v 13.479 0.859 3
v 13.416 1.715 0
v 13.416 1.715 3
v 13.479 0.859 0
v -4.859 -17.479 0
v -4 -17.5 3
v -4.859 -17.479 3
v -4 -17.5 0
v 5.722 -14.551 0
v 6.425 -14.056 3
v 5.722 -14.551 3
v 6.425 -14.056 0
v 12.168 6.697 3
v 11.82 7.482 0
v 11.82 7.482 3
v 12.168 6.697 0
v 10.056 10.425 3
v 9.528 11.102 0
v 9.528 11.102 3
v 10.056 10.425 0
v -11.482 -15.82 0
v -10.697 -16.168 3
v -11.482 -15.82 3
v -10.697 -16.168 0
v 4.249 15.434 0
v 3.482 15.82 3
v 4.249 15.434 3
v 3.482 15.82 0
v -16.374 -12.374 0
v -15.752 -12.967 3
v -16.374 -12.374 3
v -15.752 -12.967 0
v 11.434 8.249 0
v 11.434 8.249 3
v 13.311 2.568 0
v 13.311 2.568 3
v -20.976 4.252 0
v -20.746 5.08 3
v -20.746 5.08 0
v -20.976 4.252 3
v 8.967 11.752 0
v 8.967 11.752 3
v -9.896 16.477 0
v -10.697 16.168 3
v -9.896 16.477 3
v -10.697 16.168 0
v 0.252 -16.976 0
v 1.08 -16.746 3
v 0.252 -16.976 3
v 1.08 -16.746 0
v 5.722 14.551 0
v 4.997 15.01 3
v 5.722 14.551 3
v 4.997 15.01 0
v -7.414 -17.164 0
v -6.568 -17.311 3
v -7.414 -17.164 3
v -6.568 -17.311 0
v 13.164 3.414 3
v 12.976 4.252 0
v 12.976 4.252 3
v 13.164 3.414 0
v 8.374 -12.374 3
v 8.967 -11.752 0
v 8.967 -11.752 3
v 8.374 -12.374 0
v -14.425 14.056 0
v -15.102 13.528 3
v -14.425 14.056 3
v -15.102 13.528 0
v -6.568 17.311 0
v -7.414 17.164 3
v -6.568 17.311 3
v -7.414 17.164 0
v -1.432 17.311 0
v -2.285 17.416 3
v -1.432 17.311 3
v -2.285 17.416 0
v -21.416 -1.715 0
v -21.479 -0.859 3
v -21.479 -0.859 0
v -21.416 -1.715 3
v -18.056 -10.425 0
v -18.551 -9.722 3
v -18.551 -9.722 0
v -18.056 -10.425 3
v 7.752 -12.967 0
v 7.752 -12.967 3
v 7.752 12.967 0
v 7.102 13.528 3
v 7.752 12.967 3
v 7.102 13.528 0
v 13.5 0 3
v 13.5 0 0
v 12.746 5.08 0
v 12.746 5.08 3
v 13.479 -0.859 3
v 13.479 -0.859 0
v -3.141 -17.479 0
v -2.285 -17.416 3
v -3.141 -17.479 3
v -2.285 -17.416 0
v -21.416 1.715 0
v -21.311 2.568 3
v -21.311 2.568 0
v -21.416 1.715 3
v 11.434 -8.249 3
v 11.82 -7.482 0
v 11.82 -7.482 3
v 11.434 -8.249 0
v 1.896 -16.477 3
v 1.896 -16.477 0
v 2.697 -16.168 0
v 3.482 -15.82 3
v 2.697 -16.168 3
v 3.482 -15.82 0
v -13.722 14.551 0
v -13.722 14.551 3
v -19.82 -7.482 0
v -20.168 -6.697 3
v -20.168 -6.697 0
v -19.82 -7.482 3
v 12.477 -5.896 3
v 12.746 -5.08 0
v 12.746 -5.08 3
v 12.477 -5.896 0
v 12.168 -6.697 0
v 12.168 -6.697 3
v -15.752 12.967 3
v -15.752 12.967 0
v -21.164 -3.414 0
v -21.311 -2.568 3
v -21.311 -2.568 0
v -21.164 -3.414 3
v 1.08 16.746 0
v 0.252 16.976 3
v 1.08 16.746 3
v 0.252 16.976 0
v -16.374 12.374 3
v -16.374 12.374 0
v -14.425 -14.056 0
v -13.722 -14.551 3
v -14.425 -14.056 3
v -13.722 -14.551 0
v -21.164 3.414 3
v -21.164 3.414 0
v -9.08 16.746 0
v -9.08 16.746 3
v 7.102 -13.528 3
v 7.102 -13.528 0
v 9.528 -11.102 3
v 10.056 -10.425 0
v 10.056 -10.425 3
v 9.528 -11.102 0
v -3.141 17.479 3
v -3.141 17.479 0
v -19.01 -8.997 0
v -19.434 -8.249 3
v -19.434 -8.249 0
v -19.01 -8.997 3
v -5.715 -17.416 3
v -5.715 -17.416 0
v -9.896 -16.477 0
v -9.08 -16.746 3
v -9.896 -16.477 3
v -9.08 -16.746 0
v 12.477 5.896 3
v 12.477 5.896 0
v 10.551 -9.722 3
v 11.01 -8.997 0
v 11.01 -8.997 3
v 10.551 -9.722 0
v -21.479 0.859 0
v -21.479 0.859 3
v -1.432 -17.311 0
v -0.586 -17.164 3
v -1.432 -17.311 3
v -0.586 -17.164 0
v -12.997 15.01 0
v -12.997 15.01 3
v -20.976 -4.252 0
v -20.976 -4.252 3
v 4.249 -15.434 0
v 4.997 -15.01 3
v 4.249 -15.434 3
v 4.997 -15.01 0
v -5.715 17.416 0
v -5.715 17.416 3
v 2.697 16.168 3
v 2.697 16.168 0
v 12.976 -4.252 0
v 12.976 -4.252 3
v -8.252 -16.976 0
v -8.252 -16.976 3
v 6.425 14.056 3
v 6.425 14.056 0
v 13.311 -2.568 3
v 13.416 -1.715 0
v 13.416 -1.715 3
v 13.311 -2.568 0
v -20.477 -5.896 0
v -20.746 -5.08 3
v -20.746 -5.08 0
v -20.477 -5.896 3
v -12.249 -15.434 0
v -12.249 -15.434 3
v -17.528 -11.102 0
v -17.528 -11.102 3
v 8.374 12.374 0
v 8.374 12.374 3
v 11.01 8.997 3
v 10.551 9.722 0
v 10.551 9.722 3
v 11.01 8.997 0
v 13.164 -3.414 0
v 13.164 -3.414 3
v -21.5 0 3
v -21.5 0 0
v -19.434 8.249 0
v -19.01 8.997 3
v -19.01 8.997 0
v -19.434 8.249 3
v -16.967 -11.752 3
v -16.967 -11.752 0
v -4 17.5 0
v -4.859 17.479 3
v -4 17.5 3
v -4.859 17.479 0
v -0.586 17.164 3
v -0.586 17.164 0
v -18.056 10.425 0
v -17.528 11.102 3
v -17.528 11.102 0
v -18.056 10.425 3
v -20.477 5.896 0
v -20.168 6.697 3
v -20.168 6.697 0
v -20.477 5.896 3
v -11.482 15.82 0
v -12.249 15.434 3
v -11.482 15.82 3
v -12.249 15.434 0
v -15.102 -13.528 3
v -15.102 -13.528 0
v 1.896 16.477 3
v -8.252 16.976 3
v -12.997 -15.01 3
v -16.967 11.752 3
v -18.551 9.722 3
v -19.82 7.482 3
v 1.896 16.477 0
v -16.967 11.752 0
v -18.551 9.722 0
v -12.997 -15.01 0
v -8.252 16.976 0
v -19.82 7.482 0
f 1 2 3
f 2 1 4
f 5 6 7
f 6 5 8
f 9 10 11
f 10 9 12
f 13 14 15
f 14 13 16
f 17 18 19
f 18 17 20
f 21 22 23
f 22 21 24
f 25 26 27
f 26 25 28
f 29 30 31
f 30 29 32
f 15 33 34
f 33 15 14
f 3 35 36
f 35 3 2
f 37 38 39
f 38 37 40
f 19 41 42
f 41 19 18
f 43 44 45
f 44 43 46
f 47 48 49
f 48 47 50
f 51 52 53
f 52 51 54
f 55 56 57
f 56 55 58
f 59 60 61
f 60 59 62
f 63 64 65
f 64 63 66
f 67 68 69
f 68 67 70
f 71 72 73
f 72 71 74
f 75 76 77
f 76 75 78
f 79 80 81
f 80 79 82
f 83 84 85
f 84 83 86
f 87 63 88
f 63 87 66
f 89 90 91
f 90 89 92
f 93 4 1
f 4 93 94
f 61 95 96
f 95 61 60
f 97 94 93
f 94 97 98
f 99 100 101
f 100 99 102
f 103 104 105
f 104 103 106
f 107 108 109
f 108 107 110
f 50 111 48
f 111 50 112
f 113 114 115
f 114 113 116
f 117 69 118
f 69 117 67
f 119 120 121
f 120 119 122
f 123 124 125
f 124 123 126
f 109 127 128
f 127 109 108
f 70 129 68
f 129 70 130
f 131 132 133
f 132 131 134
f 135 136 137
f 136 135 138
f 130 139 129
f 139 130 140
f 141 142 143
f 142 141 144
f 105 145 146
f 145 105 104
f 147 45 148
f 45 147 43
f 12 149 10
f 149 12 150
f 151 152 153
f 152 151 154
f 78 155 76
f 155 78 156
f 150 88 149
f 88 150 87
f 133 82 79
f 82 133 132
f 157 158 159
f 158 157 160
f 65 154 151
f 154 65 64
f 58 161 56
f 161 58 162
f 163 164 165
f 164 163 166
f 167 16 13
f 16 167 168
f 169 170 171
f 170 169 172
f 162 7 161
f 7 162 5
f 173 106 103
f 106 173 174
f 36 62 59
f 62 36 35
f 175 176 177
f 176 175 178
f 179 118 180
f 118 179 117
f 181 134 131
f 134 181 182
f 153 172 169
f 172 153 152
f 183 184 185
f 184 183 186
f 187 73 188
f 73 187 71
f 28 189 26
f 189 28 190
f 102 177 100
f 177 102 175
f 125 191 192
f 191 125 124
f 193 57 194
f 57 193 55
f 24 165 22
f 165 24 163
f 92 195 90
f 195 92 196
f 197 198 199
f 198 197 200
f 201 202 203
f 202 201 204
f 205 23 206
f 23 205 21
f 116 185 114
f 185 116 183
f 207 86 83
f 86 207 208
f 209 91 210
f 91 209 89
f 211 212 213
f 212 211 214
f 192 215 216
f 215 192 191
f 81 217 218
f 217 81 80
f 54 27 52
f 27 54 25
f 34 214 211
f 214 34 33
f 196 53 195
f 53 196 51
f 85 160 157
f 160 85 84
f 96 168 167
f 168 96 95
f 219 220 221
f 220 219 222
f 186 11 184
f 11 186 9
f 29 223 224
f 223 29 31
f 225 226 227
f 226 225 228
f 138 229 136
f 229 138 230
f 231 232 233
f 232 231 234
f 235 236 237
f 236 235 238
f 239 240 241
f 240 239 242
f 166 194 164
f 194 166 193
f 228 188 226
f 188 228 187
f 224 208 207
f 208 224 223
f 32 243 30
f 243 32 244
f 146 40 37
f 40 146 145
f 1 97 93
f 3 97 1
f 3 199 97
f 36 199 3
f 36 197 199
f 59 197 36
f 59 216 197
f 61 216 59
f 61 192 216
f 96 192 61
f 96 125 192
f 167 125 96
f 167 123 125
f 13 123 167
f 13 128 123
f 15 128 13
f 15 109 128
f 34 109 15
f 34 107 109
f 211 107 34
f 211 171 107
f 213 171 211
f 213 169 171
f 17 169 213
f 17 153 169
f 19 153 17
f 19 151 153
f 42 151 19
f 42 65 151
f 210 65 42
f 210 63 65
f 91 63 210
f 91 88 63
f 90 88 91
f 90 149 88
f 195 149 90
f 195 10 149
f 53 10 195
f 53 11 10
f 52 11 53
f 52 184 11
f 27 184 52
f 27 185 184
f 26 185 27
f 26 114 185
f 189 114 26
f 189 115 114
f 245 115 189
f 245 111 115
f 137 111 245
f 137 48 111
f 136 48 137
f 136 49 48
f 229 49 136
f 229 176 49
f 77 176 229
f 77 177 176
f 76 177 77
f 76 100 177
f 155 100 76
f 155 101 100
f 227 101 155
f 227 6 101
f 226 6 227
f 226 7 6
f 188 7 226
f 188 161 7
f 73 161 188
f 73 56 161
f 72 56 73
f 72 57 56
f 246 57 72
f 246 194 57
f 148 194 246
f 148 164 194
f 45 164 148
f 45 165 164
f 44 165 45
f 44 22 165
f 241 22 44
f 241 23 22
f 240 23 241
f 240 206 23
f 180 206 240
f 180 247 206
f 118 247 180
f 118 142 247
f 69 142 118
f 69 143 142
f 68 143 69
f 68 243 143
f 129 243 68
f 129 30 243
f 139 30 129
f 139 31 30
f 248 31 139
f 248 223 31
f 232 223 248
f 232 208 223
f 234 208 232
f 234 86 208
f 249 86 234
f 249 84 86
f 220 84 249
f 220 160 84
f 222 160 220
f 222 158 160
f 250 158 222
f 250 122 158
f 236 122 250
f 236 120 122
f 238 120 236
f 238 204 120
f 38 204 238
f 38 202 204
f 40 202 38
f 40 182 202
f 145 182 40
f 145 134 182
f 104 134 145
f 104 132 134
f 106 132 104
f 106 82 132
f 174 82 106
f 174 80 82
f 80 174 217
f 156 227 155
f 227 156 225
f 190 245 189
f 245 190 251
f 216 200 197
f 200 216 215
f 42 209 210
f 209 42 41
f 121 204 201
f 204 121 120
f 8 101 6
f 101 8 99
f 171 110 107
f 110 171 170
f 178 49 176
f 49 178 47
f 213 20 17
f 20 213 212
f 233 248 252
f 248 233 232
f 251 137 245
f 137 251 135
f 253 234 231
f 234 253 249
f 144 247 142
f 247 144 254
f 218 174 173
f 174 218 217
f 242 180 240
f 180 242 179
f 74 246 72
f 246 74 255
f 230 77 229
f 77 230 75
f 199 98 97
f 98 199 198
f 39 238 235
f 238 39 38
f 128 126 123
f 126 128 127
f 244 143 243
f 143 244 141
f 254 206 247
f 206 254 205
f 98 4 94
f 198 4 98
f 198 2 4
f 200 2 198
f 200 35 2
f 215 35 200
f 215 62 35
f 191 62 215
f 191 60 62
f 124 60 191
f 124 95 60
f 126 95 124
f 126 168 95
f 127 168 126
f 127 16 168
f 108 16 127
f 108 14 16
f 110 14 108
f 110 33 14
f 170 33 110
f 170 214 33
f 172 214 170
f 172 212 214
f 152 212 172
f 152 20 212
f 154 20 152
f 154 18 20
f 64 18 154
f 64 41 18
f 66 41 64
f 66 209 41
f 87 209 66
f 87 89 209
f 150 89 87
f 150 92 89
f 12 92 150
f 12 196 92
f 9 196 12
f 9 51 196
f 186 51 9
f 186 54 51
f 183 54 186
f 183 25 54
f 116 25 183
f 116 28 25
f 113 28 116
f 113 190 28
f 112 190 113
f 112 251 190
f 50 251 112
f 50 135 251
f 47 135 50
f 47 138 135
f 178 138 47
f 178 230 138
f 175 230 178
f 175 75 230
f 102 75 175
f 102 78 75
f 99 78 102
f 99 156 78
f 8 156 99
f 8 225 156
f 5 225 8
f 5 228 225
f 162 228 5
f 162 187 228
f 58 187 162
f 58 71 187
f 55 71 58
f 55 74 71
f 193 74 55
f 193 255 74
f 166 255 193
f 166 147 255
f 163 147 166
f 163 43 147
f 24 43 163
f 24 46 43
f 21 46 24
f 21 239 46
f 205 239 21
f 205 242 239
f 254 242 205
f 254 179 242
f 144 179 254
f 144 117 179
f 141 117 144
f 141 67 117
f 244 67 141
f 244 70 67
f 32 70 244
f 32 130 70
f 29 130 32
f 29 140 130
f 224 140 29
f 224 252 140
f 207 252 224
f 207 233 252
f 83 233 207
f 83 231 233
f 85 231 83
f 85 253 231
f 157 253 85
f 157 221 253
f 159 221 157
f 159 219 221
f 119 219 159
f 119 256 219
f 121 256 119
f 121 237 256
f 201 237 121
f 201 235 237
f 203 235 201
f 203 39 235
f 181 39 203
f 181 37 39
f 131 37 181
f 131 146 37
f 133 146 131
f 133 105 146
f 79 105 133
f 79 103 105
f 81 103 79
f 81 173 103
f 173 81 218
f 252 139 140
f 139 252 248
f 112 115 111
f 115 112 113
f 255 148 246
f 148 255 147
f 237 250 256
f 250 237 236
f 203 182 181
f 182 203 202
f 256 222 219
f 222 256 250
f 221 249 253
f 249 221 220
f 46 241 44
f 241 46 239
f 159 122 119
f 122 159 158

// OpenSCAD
// file: solid.scad
/*
 * Originally by TypicalTinkerer, 2021.
 * Dual licenced under Creative Commons Attribution-Share Alike 3.0 and LGPL2 or later
 */

function flatten(as) = [for(a = as) each a];

function gen_v_loop_squares(range) = let(nr = len(range), nc = len(range[0])) [for(col = [0:nc-1]) [col,(nr-1)*nc+col,(nr-1)*nc+(col+1)%nc,(col+1)%nc]];

function gen_surf_squares(range) = let(nr = len(range), nc = len(range[0])) [for(row = [0:nr-2], col = [0:nc-1]) let(i=row*nc) [i+col, i+(col+1)%nc, i+nc+(col+1)%nc, i+nc+col]];

function gen_squares(range, closed) = closed ? 
    flatten([gen_surf_squares(range), gen_v_loop_squares(range)]) : 
    flatten([gen_surf_squares(range)]);

function gen_surface(range, closed = false) = [[for(row=range) each row], gen_squares(range, closed)];

function flip_lr_row(row) = [for(i=[len(row)-1:-1:0]) row[i]];
function flip_lr(surface) = [for(row = surface) flip_lr_row(row)];
function flip_ud(surface) = [for(i = [len(surface)-1:-1:0]) surface[i]];

function range(u0, du, un) = let(us=[for(u=[u0 : du: un]) u], ua=(un-u0)%du) ua == 0 ? us : concat(us, [un]);
   
function domain(u0, du, un, v0, dv, dn) = [for(u=range(u0, du, un)) [for(v=range(v0, dv, dn)) [u, v]]];

function first_row(surface) = surface[0];    
function last_row(surface) = surface[len(surface) - 1];

function sum(vertices, result=[0, 0, 0], i=0) = i<len(vertices) ? sum(vertices, result+vertices[i], i+1) : result;

function end_surface(def, first) = let(nr = len(def), nc = len(def[0]), row = first ? 0 : nr-1) [first ? [for(col = [nc-1:-1:0]) let(i=row*nc+col) i] : [for(col = [0:nc-1]) let(i=(nr-1)*nc+col) i]];

function gen_capped_surface(def) = let(surf=gen_surface(def)) [surf[0], concat(surf[1], end_surface(def, true), end_surface(def, false))];

module solid(def) {
    polyhedron(def[0], def[1], 10);
}
// file: klein-bottle-with-hole.scad
/*
 * Originally by TypicalTinkerer, 2021.
 * Dual licenced under Creative Commons Attribution-Share Alike 3.0 and LGPL2 or later
 */
 
use <klein-bottle-functions.scad>;
use <solid.scad>;

module bottle_top(w, a, b, c, du, dv) {
    dom1 = domain(0, du, 180, 0, dv, 360);
    inner_range1 = [for(row=dom1) [for(uv=row) let(u=uv[0], v=uv[1]) klein1(u, v, a, b, c) - (w/2)*nklein1(u, v, a, b, c)]];    
    outer_range1 = [for(row=dom1) [for(uv=row) let(u=uv[0], v=uv[1]) klein1(u, v, a, b, c) + (w/2)*nklein1(u, v, a, b, c)]];

    dom3 = domain(270, du, 360, 0, dv, 360);
    inner_range3 = [for(row=dom3) [for(uv=row) let(u=uv[0], v=uv[1]) klein2(u, v, a, b, c) - (w/2)*nklein2(u, v, a, b, c)]];    
    outer_range3 = [for(row=dom3) [for(uv=row) let(u=uv[0], v=uv[1]) klein2(u, v, a, b, c) + (w/2)*nklein2(u, v, a, b, c)]];

    range_1_3 = concat(flip_lr(inner_range3), flip_lr(inner_range1), flip_ud(flip_lr(outer_range1)), flip_ud(flip_lr(outer_range3)));
    surface_1_3 = gen_surface(range_1_3, true);
    solid(surface_1_3);
}

module bottle_bottom(w, a, b, c, du, dv) {
    dom2 = domain(180, du, 270, 0, dv, 360);
    inner_range2 = [for(row=dom2) [for(uv=row) let(u=uv[0], v=uv[1]) klein2(u, v, a, b, c) + (w/2)*nklein2(u, v, a, b, c)]];    
    outer_range2 = [for(row=dom2) [for(uv=row) let(u=uv[0], v=uv[1]) klein2(u, v, a, b, c) - (w/2)*nklein2(u, v, a, b, c)]];

    range_2 = concat(inner_range2, flip_ud(outer_range2));
    surface_2 = gen_surface(range_2, true);   

    // substract plug to create hole
    difference() {
        solid(surface_2);
        bottom_plug(w, a, b, c, du, dv, 320, 360);
    }
}

module bottom_plug(w, a, b, c, du, dv, start, end) {
    // create solid for creating hole
    dom4 = domain(start, du, end, 0, dv, 360);
    inner_range4 = [for(row=dom4) [for(uv=row) let(u=uv[0], v=uv[1]) klein2(u, v, a, b, c) - (w/2)*nklein2(u, v, a, b, c)]]; 
    plug_surface = gen_capped_surface(inner_range4);
     solid(plug_surface);
}
    
w = 0.42; // wall
a = 11; // width
b = 50; // height
c = 10; // weight
du = 5;
dv = 5;

bottle_top(w, a, b, c, du, dv);
bottle_bottom(w, a, b, c, du, dv);
// file: klein-bottle-functions.scad
/*
 * Parametrization giving the classic form in R3 (hence with self-intersection):
 * https://mathcurve.com/surfaces.gb/klein/klein.shtml
 *
 * Originally by TypicalTinkerer, 2021.
 * Dual licenced under Creative Commons Attribution-Share Alike 3.0 and LGPL2 or later
 */

a = 8; // width
b = 30; // height
c = 8; // weight

function unit_normal(v) = v / norm(v);
function normal(a, b) = let(c = cross(a, b)) unit_normal(c);

// helper function
function r(u) = c*(1 - cos(u)/2);

// first part

function klein1(u, v) = let(ru=r(u)) [
    (a*(1 + sin(u)) + ru*cos(v))*cos(u),
    (b + ru*cos(v))*sin(u),
    ru*sin(v)
];

// dklein1/du
function dklein1_du(u, v) =
[
    c*sin(u)*(cos(u) - 1)*cos(v) - a*(2*sin(u)^2 + sin(u) - 1),
    (2*b*cos(u) + c*cos(v)*(2*sin(u)^2 + 2*cos(u) - 1))/2,
    (c*cos(u - v) - c*cos(u + v))/4
];

// dklein1/dv
function dklein1_dv(u, v) =
[
    c*(cos(u) - 2)*cos(u)*sin(v)/2,
    c*sin(u)*(cos(u) - 2)*sin(v)/2,
    -c*(cos(u) - 2)*cos(v)/2
];

function nklein1(u, v) = normal(dklein1_du(u, v), dklein1_dv(u, v));

// second part

function klein2(u, v) = let(ru=r(u)) [
    a*(1 + sin(u))*cos(u) + ru*cos(v),
    b*sin(u),
    ru*sin(v)
];

// dklein2/du
function dklein2_du(u, v) =
[
    a*(-2*sin(u)^2 - sin(u) + 1) + c*sin(u)*cos(v)/2,
    b*cos(u),
    (c*cos(u - v) - c*cos(u + v))/4
];

// dklein2/dv
function dklein2_dv(u, v) =
[
    c*(cos(u)/2 - 1)*sin(v),
    0,
    -c*(cos(u)/2 - 1)*cos(v)
];

function nklein2(u, v) = normal(dklein2_du(u, v), dklein2_dv(u, v));
// main file
/*
 * Originally by TypicalTinkerer, 2022.
 * Dual licenced under Creative Commons Attribution-Share Alike 3.0 and LGPL2 or later
 */

use <klein-bottle-functions.scad>;
use <klein-bottle-with-hole.scad>
use <solid.scad>;

w = 0.42; // wall
a = 10.5; // width
b = 50; // height
c = 10; // weight
du = 5;
dv = 5;

module place() { translate([0, 0, b + c]) rotate([-90, 0, 0]) children(); }

// draw the bottle
place() {
    // the bottle consists of the following two parts, which look fine in the
    // preview, but cannot be rendered at the same time.
    bottle_top(w, a, b, c, du, dv);
    bottle_bottom(w, a, b, c, du, dv);
}

// create solid to take away from cylindrical base
dom1 = domain(0, du, 180, 0, dv, 360);
outer_range1 = [
    for(row=dom1) [
        for(uv=row) let(u=uv[0], v=uv[1]) 
            klein1(u, v, a, b, c) + (w/2)*nklein1(u, v, a, b, c)
    ]
];
solid_surface_1 = gen_capped_surface(outer_range1);

// draw the base
difference() {
    translate([-4,0,0]) cylinder(h=3, d=35, $fn=128); // base
    place() solid(solid_surface_1); // take away
}
